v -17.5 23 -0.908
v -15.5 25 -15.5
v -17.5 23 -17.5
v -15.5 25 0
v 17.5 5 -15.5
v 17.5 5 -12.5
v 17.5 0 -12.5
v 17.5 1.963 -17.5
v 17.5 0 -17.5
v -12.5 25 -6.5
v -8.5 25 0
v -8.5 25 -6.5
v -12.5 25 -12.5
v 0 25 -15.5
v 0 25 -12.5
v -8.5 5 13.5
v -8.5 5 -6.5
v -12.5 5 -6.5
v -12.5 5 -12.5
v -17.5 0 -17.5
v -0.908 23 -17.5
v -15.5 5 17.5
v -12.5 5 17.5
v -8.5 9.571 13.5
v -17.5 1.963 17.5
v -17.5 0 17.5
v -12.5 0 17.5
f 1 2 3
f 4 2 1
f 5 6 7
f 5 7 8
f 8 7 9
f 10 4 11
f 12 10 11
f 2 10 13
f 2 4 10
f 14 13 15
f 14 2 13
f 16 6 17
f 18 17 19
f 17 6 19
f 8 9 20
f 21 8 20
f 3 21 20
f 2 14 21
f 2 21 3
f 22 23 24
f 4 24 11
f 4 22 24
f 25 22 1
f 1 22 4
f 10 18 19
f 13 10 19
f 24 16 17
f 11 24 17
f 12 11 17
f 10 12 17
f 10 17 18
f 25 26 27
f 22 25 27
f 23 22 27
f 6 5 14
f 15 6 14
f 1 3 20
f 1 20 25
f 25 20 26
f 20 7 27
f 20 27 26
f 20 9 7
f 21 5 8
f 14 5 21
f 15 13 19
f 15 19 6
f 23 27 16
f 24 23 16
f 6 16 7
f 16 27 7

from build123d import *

# Parameters (mm, degrees)
BOSS_EXTRUDE1_DEPTH = 5
BOSS_EXTRUDE2_DEPTH = 20
CUT_EXTRUDE1_DEPTH  = 20
CUT_EXTRUDE2_DEPTH  = 20
CHAMFER1_SIZE       = 2


with BuildPart() as part:
    # Sketch1 → Boss-Extrude1 (new body)
    with BuildSketch(Plane(origin=(0, 0, 0), x_dir=(1, 0, 0), z_dir=(0, 1, 0))):
        Polygon((17.5, 12.5), (-12.5, -17.5), (-17.5, -17.5), (-17.5, 17.5), (17.5, 17.5), align=None)
    extrude(amount=BOSS_EXTRUDE1_DEPTH)

    # Sketch2 → Boss-Extrude2 (add)
    with BuildSketch(Plane(origin=(0, 5, 0), x_dir=(1, 0, 0), z_dir=(0, 1, 0))):
        Polygon((17.5, 17.5), (-17.5, 17.5), (-17.5, 12.5), (-17.5, -17.5), (-12.5, -17.5), (-8.5, -13.5), (-8.5, 6.5), (-12.5, 6.5), (-12.5, 12.5), (17.5, 12.5), align=None)
    extrude(amount=BOSS_EXTRUDE2_DEPTH)

    # Sketch3 → Cut-Extrude1 (cut)
    with BuildSketch(Plane(origin=(0, 0, -17.5), x_dir=(-1, 0, 0), z_dir=(0, 0, -1))):
        Polygon((-17.5, 5), (0, 25), (-17.5, 25), align=None)
    extrude(amount=-CUT_EXTRUDE1_DEPTH, mode=Mode.SUBTRACT)

    # Sketch4 → Cut-Extrude2 (cut)
    with BuildSketch(Plane.ZY.offset(17.5)):
        Polygon((17.5, 5), (0, 25), (17.5, 25), align=None)
    extrude(amount=-CUT_EXTRUDE2_DEPTH, mode=Mode.SUBTRACT)

    # Chamfer1
    chamfer1_edges = [part.edges().sort_by_distance(p)[0] for p in [
        (-17.5, 25, -8.75),
        (-8.75, 25, -17.5),
        (8.75, 15, -17.5),
        (-17.5, 15, 8.75),
    ]]
    chamfer(chamfer1_edges, length=CHAMFER1_SIZE)


solid = part.part
